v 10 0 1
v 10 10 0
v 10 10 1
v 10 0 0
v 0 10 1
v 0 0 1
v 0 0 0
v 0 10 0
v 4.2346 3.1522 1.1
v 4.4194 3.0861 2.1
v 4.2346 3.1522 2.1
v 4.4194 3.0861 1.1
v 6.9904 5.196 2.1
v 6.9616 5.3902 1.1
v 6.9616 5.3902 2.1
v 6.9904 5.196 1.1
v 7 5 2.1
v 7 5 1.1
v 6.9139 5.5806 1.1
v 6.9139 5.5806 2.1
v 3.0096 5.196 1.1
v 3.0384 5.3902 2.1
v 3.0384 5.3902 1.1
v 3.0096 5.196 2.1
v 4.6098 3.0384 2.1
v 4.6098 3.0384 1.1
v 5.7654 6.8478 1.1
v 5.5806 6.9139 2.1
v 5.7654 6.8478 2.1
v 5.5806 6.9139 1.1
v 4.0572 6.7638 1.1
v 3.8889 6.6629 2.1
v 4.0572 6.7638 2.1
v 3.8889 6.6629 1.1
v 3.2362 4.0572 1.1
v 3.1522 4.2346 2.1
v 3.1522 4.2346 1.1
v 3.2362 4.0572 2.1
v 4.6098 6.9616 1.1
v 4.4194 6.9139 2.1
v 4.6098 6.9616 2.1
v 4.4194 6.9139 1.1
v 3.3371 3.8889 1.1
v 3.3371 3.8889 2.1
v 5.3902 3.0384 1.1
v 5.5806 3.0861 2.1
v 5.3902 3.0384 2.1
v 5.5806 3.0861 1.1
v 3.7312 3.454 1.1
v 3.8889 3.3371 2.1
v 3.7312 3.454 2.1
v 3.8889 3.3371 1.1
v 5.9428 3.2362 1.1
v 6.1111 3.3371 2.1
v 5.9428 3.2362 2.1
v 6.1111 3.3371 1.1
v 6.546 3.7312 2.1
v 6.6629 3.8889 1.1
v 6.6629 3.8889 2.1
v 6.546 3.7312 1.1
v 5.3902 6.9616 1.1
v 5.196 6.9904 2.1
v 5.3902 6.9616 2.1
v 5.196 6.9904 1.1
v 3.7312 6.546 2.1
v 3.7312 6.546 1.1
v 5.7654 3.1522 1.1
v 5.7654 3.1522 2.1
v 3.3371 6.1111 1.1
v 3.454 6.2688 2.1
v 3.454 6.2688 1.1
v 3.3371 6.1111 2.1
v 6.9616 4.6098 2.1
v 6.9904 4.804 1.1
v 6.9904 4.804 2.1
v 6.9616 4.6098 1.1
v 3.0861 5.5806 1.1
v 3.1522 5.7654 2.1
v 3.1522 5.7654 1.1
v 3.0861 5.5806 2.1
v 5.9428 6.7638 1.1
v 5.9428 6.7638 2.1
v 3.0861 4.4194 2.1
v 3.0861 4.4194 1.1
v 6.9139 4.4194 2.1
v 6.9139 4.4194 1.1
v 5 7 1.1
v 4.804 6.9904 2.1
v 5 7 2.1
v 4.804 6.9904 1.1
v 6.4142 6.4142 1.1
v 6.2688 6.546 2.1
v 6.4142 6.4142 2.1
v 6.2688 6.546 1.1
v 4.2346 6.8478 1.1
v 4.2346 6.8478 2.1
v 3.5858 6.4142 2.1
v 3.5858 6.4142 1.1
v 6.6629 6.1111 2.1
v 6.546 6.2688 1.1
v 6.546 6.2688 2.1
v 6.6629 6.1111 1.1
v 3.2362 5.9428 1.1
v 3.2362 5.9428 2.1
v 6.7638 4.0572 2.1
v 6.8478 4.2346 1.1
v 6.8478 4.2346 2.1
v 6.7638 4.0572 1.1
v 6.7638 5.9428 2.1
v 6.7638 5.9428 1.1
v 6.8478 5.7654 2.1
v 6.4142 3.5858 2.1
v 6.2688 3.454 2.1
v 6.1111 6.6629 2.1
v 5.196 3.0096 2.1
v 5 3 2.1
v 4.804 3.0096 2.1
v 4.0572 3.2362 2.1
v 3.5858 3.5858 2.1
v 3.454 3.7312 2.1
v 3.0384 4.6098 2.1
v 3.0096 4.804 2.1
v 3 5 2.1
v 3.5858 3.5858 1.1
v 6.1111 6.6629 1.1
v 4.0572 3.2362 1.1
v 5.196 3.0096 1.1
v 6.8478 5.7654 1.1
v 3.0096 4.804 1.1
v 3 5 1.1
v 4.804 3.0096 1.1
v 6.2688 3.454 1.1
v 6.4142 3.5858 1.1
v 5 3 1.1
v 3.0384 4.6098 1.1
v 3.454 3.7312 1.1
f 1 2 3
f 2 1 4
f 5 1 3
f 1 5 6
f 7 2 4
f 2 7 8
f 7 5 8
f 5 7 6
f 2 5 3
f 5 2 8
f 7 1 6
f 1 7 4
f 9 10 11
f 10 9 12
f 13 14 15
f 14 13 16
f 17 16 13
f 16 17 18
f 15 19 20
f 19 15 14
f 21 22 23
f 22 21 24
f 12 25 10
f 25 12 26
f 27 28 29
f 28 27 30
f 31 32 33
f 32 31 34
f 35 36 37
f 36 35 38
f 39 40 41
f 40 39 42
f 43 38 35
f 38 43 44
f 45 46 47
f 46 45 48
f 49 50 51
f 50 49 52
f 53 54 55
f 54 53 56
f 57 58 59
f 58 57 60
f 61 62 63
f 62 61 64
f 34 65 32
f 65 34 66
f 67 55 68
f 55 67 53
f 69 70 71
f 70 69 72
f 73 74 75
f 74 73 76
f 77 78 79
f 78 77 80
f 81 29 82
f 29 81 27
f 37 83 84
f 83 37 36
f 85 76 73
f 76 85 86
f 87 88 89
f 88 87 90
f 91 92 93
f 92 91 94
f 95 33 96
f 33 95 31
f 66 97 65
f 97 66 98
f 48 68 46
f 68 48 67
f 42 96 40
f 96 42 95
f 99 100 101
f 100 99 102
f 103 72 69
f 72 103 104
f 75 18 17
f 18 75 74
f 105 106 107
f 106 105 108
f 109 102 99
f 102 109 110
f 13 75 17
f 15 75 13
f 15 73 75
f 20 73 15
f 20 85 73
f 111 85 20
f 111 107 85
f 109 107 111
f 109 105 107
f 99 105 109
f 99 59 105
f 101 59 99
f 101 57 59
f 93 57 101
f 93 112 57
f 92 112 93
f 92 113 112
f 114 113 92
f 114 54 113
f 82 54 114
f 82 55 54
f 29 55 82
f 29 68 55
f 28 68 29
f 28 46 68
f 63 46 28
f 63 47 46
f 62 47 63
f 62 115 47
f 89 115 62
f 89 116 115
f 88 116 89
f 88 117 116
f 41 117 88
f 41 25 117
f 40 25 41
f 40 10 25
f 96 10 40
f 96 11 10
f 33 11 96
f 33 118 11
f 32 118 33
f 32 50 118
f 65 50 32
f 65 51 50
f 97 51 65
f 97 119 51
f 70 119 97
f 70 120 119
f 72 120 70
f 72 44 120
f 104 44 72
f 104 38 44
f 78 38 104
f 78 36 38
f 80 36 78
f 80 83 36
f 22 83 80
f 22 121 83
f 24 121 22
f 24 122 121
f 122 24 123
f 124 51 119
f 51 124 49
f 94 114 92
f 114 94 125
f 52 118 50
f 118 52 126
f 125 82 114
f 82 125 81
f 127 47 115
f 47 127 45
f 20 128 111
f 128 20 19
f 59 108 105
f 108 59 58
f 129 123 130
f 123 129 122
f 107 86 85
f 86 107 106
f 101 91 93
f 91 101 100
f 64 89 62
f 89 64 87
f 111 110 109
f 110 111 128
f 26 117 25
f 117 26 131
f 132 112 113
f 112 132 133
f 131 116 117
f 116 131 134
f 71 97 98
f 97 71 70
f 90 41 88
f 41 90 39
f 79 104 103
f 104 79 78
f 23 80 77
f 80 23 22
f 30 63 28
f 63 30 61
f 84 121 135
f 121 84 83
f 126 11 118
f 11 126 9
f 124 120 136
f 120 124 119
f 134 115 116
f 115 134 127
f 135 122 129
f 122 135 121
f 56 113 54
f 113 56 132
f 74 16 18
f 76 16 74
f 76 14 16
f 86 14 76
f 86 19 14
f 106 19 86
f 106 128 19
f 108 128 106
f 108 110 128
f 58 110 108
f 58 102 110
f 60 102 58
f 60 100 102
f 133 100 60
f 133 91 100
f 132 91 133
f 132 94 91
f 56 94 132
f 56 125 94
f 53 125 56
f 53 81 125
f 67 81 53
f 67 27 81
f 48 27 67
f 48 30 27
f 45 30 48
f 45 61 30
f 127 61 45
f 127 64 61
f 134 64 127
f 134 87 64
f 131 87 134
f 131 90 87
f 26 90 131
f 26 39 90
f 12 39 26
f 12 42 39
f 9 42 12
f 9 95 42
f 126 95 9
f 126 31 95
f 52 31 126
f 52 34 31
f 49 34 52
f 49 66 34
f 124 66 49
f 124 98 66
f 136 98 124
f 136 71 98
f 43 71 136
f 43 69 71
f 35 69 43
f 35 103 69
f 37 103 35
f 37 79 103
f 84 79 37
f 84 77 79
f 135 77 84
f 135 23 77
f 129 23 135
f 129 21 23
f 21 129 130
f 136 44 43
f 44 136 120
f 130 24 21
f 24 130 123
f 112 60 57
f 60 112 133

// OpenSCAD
// file: triangle.scad
module triangle(base=10, length=10, rise=2.5, z=1){
    
    points=[
        //bottom and top triangle portion
        [0,0,0],[0,0,z],[0,base,0],[0,base,z],
        [length,rise,0],[length,rise,z],
    ];
    
    faces=[
        [0,2,4], //bot
        [5,3,1], //top
        [0,2,3,1], //tangent brick
        [0,1,5,4], //side square
        [4,5,3,2], //side square
    ];
           
        
     polyhedron(points, faces);
        
        
 
    
    }
//triangle();
// main file
use <triangle.scad>

$fn=64;
color("green")
cube([10,10,1]);

translate([5,5,1.1]) cylinder(h=1, r=2);

//North
translate([6,7.25,1.1]) rotate([0,0,90]) triangle(2,2.2,1,1);

//East
translate([7.25,4,1.1]) rotate([0,0,0])
    triangle(2,2.2,1,1);
//West    
translate([2.75,6,1.1])
    rotate([0,0,180])
    triangle(2,2.2,1,1);
//South
translate([4,2.725,1.1])
    rotate([0,0,-90])
    triangle(2,2.2,1,1);
//Northwest    
translate([3.75, 7.5, 1.1])
    rotate([0,0,135])
    triangle(2,2,1,1);
//Northeast
translate([7.75,6,1.1])
    rotate([0,0,45])
    triangle(2,2,1,1);
    
translate([2.15,3.85,1.1])
    rotate([0,0,225])
    triangle(2,2,1,1);
    
translate([6.15,2.45,1.1])
    rotate([0,0,315])
    triangle(2,2,1,1);
